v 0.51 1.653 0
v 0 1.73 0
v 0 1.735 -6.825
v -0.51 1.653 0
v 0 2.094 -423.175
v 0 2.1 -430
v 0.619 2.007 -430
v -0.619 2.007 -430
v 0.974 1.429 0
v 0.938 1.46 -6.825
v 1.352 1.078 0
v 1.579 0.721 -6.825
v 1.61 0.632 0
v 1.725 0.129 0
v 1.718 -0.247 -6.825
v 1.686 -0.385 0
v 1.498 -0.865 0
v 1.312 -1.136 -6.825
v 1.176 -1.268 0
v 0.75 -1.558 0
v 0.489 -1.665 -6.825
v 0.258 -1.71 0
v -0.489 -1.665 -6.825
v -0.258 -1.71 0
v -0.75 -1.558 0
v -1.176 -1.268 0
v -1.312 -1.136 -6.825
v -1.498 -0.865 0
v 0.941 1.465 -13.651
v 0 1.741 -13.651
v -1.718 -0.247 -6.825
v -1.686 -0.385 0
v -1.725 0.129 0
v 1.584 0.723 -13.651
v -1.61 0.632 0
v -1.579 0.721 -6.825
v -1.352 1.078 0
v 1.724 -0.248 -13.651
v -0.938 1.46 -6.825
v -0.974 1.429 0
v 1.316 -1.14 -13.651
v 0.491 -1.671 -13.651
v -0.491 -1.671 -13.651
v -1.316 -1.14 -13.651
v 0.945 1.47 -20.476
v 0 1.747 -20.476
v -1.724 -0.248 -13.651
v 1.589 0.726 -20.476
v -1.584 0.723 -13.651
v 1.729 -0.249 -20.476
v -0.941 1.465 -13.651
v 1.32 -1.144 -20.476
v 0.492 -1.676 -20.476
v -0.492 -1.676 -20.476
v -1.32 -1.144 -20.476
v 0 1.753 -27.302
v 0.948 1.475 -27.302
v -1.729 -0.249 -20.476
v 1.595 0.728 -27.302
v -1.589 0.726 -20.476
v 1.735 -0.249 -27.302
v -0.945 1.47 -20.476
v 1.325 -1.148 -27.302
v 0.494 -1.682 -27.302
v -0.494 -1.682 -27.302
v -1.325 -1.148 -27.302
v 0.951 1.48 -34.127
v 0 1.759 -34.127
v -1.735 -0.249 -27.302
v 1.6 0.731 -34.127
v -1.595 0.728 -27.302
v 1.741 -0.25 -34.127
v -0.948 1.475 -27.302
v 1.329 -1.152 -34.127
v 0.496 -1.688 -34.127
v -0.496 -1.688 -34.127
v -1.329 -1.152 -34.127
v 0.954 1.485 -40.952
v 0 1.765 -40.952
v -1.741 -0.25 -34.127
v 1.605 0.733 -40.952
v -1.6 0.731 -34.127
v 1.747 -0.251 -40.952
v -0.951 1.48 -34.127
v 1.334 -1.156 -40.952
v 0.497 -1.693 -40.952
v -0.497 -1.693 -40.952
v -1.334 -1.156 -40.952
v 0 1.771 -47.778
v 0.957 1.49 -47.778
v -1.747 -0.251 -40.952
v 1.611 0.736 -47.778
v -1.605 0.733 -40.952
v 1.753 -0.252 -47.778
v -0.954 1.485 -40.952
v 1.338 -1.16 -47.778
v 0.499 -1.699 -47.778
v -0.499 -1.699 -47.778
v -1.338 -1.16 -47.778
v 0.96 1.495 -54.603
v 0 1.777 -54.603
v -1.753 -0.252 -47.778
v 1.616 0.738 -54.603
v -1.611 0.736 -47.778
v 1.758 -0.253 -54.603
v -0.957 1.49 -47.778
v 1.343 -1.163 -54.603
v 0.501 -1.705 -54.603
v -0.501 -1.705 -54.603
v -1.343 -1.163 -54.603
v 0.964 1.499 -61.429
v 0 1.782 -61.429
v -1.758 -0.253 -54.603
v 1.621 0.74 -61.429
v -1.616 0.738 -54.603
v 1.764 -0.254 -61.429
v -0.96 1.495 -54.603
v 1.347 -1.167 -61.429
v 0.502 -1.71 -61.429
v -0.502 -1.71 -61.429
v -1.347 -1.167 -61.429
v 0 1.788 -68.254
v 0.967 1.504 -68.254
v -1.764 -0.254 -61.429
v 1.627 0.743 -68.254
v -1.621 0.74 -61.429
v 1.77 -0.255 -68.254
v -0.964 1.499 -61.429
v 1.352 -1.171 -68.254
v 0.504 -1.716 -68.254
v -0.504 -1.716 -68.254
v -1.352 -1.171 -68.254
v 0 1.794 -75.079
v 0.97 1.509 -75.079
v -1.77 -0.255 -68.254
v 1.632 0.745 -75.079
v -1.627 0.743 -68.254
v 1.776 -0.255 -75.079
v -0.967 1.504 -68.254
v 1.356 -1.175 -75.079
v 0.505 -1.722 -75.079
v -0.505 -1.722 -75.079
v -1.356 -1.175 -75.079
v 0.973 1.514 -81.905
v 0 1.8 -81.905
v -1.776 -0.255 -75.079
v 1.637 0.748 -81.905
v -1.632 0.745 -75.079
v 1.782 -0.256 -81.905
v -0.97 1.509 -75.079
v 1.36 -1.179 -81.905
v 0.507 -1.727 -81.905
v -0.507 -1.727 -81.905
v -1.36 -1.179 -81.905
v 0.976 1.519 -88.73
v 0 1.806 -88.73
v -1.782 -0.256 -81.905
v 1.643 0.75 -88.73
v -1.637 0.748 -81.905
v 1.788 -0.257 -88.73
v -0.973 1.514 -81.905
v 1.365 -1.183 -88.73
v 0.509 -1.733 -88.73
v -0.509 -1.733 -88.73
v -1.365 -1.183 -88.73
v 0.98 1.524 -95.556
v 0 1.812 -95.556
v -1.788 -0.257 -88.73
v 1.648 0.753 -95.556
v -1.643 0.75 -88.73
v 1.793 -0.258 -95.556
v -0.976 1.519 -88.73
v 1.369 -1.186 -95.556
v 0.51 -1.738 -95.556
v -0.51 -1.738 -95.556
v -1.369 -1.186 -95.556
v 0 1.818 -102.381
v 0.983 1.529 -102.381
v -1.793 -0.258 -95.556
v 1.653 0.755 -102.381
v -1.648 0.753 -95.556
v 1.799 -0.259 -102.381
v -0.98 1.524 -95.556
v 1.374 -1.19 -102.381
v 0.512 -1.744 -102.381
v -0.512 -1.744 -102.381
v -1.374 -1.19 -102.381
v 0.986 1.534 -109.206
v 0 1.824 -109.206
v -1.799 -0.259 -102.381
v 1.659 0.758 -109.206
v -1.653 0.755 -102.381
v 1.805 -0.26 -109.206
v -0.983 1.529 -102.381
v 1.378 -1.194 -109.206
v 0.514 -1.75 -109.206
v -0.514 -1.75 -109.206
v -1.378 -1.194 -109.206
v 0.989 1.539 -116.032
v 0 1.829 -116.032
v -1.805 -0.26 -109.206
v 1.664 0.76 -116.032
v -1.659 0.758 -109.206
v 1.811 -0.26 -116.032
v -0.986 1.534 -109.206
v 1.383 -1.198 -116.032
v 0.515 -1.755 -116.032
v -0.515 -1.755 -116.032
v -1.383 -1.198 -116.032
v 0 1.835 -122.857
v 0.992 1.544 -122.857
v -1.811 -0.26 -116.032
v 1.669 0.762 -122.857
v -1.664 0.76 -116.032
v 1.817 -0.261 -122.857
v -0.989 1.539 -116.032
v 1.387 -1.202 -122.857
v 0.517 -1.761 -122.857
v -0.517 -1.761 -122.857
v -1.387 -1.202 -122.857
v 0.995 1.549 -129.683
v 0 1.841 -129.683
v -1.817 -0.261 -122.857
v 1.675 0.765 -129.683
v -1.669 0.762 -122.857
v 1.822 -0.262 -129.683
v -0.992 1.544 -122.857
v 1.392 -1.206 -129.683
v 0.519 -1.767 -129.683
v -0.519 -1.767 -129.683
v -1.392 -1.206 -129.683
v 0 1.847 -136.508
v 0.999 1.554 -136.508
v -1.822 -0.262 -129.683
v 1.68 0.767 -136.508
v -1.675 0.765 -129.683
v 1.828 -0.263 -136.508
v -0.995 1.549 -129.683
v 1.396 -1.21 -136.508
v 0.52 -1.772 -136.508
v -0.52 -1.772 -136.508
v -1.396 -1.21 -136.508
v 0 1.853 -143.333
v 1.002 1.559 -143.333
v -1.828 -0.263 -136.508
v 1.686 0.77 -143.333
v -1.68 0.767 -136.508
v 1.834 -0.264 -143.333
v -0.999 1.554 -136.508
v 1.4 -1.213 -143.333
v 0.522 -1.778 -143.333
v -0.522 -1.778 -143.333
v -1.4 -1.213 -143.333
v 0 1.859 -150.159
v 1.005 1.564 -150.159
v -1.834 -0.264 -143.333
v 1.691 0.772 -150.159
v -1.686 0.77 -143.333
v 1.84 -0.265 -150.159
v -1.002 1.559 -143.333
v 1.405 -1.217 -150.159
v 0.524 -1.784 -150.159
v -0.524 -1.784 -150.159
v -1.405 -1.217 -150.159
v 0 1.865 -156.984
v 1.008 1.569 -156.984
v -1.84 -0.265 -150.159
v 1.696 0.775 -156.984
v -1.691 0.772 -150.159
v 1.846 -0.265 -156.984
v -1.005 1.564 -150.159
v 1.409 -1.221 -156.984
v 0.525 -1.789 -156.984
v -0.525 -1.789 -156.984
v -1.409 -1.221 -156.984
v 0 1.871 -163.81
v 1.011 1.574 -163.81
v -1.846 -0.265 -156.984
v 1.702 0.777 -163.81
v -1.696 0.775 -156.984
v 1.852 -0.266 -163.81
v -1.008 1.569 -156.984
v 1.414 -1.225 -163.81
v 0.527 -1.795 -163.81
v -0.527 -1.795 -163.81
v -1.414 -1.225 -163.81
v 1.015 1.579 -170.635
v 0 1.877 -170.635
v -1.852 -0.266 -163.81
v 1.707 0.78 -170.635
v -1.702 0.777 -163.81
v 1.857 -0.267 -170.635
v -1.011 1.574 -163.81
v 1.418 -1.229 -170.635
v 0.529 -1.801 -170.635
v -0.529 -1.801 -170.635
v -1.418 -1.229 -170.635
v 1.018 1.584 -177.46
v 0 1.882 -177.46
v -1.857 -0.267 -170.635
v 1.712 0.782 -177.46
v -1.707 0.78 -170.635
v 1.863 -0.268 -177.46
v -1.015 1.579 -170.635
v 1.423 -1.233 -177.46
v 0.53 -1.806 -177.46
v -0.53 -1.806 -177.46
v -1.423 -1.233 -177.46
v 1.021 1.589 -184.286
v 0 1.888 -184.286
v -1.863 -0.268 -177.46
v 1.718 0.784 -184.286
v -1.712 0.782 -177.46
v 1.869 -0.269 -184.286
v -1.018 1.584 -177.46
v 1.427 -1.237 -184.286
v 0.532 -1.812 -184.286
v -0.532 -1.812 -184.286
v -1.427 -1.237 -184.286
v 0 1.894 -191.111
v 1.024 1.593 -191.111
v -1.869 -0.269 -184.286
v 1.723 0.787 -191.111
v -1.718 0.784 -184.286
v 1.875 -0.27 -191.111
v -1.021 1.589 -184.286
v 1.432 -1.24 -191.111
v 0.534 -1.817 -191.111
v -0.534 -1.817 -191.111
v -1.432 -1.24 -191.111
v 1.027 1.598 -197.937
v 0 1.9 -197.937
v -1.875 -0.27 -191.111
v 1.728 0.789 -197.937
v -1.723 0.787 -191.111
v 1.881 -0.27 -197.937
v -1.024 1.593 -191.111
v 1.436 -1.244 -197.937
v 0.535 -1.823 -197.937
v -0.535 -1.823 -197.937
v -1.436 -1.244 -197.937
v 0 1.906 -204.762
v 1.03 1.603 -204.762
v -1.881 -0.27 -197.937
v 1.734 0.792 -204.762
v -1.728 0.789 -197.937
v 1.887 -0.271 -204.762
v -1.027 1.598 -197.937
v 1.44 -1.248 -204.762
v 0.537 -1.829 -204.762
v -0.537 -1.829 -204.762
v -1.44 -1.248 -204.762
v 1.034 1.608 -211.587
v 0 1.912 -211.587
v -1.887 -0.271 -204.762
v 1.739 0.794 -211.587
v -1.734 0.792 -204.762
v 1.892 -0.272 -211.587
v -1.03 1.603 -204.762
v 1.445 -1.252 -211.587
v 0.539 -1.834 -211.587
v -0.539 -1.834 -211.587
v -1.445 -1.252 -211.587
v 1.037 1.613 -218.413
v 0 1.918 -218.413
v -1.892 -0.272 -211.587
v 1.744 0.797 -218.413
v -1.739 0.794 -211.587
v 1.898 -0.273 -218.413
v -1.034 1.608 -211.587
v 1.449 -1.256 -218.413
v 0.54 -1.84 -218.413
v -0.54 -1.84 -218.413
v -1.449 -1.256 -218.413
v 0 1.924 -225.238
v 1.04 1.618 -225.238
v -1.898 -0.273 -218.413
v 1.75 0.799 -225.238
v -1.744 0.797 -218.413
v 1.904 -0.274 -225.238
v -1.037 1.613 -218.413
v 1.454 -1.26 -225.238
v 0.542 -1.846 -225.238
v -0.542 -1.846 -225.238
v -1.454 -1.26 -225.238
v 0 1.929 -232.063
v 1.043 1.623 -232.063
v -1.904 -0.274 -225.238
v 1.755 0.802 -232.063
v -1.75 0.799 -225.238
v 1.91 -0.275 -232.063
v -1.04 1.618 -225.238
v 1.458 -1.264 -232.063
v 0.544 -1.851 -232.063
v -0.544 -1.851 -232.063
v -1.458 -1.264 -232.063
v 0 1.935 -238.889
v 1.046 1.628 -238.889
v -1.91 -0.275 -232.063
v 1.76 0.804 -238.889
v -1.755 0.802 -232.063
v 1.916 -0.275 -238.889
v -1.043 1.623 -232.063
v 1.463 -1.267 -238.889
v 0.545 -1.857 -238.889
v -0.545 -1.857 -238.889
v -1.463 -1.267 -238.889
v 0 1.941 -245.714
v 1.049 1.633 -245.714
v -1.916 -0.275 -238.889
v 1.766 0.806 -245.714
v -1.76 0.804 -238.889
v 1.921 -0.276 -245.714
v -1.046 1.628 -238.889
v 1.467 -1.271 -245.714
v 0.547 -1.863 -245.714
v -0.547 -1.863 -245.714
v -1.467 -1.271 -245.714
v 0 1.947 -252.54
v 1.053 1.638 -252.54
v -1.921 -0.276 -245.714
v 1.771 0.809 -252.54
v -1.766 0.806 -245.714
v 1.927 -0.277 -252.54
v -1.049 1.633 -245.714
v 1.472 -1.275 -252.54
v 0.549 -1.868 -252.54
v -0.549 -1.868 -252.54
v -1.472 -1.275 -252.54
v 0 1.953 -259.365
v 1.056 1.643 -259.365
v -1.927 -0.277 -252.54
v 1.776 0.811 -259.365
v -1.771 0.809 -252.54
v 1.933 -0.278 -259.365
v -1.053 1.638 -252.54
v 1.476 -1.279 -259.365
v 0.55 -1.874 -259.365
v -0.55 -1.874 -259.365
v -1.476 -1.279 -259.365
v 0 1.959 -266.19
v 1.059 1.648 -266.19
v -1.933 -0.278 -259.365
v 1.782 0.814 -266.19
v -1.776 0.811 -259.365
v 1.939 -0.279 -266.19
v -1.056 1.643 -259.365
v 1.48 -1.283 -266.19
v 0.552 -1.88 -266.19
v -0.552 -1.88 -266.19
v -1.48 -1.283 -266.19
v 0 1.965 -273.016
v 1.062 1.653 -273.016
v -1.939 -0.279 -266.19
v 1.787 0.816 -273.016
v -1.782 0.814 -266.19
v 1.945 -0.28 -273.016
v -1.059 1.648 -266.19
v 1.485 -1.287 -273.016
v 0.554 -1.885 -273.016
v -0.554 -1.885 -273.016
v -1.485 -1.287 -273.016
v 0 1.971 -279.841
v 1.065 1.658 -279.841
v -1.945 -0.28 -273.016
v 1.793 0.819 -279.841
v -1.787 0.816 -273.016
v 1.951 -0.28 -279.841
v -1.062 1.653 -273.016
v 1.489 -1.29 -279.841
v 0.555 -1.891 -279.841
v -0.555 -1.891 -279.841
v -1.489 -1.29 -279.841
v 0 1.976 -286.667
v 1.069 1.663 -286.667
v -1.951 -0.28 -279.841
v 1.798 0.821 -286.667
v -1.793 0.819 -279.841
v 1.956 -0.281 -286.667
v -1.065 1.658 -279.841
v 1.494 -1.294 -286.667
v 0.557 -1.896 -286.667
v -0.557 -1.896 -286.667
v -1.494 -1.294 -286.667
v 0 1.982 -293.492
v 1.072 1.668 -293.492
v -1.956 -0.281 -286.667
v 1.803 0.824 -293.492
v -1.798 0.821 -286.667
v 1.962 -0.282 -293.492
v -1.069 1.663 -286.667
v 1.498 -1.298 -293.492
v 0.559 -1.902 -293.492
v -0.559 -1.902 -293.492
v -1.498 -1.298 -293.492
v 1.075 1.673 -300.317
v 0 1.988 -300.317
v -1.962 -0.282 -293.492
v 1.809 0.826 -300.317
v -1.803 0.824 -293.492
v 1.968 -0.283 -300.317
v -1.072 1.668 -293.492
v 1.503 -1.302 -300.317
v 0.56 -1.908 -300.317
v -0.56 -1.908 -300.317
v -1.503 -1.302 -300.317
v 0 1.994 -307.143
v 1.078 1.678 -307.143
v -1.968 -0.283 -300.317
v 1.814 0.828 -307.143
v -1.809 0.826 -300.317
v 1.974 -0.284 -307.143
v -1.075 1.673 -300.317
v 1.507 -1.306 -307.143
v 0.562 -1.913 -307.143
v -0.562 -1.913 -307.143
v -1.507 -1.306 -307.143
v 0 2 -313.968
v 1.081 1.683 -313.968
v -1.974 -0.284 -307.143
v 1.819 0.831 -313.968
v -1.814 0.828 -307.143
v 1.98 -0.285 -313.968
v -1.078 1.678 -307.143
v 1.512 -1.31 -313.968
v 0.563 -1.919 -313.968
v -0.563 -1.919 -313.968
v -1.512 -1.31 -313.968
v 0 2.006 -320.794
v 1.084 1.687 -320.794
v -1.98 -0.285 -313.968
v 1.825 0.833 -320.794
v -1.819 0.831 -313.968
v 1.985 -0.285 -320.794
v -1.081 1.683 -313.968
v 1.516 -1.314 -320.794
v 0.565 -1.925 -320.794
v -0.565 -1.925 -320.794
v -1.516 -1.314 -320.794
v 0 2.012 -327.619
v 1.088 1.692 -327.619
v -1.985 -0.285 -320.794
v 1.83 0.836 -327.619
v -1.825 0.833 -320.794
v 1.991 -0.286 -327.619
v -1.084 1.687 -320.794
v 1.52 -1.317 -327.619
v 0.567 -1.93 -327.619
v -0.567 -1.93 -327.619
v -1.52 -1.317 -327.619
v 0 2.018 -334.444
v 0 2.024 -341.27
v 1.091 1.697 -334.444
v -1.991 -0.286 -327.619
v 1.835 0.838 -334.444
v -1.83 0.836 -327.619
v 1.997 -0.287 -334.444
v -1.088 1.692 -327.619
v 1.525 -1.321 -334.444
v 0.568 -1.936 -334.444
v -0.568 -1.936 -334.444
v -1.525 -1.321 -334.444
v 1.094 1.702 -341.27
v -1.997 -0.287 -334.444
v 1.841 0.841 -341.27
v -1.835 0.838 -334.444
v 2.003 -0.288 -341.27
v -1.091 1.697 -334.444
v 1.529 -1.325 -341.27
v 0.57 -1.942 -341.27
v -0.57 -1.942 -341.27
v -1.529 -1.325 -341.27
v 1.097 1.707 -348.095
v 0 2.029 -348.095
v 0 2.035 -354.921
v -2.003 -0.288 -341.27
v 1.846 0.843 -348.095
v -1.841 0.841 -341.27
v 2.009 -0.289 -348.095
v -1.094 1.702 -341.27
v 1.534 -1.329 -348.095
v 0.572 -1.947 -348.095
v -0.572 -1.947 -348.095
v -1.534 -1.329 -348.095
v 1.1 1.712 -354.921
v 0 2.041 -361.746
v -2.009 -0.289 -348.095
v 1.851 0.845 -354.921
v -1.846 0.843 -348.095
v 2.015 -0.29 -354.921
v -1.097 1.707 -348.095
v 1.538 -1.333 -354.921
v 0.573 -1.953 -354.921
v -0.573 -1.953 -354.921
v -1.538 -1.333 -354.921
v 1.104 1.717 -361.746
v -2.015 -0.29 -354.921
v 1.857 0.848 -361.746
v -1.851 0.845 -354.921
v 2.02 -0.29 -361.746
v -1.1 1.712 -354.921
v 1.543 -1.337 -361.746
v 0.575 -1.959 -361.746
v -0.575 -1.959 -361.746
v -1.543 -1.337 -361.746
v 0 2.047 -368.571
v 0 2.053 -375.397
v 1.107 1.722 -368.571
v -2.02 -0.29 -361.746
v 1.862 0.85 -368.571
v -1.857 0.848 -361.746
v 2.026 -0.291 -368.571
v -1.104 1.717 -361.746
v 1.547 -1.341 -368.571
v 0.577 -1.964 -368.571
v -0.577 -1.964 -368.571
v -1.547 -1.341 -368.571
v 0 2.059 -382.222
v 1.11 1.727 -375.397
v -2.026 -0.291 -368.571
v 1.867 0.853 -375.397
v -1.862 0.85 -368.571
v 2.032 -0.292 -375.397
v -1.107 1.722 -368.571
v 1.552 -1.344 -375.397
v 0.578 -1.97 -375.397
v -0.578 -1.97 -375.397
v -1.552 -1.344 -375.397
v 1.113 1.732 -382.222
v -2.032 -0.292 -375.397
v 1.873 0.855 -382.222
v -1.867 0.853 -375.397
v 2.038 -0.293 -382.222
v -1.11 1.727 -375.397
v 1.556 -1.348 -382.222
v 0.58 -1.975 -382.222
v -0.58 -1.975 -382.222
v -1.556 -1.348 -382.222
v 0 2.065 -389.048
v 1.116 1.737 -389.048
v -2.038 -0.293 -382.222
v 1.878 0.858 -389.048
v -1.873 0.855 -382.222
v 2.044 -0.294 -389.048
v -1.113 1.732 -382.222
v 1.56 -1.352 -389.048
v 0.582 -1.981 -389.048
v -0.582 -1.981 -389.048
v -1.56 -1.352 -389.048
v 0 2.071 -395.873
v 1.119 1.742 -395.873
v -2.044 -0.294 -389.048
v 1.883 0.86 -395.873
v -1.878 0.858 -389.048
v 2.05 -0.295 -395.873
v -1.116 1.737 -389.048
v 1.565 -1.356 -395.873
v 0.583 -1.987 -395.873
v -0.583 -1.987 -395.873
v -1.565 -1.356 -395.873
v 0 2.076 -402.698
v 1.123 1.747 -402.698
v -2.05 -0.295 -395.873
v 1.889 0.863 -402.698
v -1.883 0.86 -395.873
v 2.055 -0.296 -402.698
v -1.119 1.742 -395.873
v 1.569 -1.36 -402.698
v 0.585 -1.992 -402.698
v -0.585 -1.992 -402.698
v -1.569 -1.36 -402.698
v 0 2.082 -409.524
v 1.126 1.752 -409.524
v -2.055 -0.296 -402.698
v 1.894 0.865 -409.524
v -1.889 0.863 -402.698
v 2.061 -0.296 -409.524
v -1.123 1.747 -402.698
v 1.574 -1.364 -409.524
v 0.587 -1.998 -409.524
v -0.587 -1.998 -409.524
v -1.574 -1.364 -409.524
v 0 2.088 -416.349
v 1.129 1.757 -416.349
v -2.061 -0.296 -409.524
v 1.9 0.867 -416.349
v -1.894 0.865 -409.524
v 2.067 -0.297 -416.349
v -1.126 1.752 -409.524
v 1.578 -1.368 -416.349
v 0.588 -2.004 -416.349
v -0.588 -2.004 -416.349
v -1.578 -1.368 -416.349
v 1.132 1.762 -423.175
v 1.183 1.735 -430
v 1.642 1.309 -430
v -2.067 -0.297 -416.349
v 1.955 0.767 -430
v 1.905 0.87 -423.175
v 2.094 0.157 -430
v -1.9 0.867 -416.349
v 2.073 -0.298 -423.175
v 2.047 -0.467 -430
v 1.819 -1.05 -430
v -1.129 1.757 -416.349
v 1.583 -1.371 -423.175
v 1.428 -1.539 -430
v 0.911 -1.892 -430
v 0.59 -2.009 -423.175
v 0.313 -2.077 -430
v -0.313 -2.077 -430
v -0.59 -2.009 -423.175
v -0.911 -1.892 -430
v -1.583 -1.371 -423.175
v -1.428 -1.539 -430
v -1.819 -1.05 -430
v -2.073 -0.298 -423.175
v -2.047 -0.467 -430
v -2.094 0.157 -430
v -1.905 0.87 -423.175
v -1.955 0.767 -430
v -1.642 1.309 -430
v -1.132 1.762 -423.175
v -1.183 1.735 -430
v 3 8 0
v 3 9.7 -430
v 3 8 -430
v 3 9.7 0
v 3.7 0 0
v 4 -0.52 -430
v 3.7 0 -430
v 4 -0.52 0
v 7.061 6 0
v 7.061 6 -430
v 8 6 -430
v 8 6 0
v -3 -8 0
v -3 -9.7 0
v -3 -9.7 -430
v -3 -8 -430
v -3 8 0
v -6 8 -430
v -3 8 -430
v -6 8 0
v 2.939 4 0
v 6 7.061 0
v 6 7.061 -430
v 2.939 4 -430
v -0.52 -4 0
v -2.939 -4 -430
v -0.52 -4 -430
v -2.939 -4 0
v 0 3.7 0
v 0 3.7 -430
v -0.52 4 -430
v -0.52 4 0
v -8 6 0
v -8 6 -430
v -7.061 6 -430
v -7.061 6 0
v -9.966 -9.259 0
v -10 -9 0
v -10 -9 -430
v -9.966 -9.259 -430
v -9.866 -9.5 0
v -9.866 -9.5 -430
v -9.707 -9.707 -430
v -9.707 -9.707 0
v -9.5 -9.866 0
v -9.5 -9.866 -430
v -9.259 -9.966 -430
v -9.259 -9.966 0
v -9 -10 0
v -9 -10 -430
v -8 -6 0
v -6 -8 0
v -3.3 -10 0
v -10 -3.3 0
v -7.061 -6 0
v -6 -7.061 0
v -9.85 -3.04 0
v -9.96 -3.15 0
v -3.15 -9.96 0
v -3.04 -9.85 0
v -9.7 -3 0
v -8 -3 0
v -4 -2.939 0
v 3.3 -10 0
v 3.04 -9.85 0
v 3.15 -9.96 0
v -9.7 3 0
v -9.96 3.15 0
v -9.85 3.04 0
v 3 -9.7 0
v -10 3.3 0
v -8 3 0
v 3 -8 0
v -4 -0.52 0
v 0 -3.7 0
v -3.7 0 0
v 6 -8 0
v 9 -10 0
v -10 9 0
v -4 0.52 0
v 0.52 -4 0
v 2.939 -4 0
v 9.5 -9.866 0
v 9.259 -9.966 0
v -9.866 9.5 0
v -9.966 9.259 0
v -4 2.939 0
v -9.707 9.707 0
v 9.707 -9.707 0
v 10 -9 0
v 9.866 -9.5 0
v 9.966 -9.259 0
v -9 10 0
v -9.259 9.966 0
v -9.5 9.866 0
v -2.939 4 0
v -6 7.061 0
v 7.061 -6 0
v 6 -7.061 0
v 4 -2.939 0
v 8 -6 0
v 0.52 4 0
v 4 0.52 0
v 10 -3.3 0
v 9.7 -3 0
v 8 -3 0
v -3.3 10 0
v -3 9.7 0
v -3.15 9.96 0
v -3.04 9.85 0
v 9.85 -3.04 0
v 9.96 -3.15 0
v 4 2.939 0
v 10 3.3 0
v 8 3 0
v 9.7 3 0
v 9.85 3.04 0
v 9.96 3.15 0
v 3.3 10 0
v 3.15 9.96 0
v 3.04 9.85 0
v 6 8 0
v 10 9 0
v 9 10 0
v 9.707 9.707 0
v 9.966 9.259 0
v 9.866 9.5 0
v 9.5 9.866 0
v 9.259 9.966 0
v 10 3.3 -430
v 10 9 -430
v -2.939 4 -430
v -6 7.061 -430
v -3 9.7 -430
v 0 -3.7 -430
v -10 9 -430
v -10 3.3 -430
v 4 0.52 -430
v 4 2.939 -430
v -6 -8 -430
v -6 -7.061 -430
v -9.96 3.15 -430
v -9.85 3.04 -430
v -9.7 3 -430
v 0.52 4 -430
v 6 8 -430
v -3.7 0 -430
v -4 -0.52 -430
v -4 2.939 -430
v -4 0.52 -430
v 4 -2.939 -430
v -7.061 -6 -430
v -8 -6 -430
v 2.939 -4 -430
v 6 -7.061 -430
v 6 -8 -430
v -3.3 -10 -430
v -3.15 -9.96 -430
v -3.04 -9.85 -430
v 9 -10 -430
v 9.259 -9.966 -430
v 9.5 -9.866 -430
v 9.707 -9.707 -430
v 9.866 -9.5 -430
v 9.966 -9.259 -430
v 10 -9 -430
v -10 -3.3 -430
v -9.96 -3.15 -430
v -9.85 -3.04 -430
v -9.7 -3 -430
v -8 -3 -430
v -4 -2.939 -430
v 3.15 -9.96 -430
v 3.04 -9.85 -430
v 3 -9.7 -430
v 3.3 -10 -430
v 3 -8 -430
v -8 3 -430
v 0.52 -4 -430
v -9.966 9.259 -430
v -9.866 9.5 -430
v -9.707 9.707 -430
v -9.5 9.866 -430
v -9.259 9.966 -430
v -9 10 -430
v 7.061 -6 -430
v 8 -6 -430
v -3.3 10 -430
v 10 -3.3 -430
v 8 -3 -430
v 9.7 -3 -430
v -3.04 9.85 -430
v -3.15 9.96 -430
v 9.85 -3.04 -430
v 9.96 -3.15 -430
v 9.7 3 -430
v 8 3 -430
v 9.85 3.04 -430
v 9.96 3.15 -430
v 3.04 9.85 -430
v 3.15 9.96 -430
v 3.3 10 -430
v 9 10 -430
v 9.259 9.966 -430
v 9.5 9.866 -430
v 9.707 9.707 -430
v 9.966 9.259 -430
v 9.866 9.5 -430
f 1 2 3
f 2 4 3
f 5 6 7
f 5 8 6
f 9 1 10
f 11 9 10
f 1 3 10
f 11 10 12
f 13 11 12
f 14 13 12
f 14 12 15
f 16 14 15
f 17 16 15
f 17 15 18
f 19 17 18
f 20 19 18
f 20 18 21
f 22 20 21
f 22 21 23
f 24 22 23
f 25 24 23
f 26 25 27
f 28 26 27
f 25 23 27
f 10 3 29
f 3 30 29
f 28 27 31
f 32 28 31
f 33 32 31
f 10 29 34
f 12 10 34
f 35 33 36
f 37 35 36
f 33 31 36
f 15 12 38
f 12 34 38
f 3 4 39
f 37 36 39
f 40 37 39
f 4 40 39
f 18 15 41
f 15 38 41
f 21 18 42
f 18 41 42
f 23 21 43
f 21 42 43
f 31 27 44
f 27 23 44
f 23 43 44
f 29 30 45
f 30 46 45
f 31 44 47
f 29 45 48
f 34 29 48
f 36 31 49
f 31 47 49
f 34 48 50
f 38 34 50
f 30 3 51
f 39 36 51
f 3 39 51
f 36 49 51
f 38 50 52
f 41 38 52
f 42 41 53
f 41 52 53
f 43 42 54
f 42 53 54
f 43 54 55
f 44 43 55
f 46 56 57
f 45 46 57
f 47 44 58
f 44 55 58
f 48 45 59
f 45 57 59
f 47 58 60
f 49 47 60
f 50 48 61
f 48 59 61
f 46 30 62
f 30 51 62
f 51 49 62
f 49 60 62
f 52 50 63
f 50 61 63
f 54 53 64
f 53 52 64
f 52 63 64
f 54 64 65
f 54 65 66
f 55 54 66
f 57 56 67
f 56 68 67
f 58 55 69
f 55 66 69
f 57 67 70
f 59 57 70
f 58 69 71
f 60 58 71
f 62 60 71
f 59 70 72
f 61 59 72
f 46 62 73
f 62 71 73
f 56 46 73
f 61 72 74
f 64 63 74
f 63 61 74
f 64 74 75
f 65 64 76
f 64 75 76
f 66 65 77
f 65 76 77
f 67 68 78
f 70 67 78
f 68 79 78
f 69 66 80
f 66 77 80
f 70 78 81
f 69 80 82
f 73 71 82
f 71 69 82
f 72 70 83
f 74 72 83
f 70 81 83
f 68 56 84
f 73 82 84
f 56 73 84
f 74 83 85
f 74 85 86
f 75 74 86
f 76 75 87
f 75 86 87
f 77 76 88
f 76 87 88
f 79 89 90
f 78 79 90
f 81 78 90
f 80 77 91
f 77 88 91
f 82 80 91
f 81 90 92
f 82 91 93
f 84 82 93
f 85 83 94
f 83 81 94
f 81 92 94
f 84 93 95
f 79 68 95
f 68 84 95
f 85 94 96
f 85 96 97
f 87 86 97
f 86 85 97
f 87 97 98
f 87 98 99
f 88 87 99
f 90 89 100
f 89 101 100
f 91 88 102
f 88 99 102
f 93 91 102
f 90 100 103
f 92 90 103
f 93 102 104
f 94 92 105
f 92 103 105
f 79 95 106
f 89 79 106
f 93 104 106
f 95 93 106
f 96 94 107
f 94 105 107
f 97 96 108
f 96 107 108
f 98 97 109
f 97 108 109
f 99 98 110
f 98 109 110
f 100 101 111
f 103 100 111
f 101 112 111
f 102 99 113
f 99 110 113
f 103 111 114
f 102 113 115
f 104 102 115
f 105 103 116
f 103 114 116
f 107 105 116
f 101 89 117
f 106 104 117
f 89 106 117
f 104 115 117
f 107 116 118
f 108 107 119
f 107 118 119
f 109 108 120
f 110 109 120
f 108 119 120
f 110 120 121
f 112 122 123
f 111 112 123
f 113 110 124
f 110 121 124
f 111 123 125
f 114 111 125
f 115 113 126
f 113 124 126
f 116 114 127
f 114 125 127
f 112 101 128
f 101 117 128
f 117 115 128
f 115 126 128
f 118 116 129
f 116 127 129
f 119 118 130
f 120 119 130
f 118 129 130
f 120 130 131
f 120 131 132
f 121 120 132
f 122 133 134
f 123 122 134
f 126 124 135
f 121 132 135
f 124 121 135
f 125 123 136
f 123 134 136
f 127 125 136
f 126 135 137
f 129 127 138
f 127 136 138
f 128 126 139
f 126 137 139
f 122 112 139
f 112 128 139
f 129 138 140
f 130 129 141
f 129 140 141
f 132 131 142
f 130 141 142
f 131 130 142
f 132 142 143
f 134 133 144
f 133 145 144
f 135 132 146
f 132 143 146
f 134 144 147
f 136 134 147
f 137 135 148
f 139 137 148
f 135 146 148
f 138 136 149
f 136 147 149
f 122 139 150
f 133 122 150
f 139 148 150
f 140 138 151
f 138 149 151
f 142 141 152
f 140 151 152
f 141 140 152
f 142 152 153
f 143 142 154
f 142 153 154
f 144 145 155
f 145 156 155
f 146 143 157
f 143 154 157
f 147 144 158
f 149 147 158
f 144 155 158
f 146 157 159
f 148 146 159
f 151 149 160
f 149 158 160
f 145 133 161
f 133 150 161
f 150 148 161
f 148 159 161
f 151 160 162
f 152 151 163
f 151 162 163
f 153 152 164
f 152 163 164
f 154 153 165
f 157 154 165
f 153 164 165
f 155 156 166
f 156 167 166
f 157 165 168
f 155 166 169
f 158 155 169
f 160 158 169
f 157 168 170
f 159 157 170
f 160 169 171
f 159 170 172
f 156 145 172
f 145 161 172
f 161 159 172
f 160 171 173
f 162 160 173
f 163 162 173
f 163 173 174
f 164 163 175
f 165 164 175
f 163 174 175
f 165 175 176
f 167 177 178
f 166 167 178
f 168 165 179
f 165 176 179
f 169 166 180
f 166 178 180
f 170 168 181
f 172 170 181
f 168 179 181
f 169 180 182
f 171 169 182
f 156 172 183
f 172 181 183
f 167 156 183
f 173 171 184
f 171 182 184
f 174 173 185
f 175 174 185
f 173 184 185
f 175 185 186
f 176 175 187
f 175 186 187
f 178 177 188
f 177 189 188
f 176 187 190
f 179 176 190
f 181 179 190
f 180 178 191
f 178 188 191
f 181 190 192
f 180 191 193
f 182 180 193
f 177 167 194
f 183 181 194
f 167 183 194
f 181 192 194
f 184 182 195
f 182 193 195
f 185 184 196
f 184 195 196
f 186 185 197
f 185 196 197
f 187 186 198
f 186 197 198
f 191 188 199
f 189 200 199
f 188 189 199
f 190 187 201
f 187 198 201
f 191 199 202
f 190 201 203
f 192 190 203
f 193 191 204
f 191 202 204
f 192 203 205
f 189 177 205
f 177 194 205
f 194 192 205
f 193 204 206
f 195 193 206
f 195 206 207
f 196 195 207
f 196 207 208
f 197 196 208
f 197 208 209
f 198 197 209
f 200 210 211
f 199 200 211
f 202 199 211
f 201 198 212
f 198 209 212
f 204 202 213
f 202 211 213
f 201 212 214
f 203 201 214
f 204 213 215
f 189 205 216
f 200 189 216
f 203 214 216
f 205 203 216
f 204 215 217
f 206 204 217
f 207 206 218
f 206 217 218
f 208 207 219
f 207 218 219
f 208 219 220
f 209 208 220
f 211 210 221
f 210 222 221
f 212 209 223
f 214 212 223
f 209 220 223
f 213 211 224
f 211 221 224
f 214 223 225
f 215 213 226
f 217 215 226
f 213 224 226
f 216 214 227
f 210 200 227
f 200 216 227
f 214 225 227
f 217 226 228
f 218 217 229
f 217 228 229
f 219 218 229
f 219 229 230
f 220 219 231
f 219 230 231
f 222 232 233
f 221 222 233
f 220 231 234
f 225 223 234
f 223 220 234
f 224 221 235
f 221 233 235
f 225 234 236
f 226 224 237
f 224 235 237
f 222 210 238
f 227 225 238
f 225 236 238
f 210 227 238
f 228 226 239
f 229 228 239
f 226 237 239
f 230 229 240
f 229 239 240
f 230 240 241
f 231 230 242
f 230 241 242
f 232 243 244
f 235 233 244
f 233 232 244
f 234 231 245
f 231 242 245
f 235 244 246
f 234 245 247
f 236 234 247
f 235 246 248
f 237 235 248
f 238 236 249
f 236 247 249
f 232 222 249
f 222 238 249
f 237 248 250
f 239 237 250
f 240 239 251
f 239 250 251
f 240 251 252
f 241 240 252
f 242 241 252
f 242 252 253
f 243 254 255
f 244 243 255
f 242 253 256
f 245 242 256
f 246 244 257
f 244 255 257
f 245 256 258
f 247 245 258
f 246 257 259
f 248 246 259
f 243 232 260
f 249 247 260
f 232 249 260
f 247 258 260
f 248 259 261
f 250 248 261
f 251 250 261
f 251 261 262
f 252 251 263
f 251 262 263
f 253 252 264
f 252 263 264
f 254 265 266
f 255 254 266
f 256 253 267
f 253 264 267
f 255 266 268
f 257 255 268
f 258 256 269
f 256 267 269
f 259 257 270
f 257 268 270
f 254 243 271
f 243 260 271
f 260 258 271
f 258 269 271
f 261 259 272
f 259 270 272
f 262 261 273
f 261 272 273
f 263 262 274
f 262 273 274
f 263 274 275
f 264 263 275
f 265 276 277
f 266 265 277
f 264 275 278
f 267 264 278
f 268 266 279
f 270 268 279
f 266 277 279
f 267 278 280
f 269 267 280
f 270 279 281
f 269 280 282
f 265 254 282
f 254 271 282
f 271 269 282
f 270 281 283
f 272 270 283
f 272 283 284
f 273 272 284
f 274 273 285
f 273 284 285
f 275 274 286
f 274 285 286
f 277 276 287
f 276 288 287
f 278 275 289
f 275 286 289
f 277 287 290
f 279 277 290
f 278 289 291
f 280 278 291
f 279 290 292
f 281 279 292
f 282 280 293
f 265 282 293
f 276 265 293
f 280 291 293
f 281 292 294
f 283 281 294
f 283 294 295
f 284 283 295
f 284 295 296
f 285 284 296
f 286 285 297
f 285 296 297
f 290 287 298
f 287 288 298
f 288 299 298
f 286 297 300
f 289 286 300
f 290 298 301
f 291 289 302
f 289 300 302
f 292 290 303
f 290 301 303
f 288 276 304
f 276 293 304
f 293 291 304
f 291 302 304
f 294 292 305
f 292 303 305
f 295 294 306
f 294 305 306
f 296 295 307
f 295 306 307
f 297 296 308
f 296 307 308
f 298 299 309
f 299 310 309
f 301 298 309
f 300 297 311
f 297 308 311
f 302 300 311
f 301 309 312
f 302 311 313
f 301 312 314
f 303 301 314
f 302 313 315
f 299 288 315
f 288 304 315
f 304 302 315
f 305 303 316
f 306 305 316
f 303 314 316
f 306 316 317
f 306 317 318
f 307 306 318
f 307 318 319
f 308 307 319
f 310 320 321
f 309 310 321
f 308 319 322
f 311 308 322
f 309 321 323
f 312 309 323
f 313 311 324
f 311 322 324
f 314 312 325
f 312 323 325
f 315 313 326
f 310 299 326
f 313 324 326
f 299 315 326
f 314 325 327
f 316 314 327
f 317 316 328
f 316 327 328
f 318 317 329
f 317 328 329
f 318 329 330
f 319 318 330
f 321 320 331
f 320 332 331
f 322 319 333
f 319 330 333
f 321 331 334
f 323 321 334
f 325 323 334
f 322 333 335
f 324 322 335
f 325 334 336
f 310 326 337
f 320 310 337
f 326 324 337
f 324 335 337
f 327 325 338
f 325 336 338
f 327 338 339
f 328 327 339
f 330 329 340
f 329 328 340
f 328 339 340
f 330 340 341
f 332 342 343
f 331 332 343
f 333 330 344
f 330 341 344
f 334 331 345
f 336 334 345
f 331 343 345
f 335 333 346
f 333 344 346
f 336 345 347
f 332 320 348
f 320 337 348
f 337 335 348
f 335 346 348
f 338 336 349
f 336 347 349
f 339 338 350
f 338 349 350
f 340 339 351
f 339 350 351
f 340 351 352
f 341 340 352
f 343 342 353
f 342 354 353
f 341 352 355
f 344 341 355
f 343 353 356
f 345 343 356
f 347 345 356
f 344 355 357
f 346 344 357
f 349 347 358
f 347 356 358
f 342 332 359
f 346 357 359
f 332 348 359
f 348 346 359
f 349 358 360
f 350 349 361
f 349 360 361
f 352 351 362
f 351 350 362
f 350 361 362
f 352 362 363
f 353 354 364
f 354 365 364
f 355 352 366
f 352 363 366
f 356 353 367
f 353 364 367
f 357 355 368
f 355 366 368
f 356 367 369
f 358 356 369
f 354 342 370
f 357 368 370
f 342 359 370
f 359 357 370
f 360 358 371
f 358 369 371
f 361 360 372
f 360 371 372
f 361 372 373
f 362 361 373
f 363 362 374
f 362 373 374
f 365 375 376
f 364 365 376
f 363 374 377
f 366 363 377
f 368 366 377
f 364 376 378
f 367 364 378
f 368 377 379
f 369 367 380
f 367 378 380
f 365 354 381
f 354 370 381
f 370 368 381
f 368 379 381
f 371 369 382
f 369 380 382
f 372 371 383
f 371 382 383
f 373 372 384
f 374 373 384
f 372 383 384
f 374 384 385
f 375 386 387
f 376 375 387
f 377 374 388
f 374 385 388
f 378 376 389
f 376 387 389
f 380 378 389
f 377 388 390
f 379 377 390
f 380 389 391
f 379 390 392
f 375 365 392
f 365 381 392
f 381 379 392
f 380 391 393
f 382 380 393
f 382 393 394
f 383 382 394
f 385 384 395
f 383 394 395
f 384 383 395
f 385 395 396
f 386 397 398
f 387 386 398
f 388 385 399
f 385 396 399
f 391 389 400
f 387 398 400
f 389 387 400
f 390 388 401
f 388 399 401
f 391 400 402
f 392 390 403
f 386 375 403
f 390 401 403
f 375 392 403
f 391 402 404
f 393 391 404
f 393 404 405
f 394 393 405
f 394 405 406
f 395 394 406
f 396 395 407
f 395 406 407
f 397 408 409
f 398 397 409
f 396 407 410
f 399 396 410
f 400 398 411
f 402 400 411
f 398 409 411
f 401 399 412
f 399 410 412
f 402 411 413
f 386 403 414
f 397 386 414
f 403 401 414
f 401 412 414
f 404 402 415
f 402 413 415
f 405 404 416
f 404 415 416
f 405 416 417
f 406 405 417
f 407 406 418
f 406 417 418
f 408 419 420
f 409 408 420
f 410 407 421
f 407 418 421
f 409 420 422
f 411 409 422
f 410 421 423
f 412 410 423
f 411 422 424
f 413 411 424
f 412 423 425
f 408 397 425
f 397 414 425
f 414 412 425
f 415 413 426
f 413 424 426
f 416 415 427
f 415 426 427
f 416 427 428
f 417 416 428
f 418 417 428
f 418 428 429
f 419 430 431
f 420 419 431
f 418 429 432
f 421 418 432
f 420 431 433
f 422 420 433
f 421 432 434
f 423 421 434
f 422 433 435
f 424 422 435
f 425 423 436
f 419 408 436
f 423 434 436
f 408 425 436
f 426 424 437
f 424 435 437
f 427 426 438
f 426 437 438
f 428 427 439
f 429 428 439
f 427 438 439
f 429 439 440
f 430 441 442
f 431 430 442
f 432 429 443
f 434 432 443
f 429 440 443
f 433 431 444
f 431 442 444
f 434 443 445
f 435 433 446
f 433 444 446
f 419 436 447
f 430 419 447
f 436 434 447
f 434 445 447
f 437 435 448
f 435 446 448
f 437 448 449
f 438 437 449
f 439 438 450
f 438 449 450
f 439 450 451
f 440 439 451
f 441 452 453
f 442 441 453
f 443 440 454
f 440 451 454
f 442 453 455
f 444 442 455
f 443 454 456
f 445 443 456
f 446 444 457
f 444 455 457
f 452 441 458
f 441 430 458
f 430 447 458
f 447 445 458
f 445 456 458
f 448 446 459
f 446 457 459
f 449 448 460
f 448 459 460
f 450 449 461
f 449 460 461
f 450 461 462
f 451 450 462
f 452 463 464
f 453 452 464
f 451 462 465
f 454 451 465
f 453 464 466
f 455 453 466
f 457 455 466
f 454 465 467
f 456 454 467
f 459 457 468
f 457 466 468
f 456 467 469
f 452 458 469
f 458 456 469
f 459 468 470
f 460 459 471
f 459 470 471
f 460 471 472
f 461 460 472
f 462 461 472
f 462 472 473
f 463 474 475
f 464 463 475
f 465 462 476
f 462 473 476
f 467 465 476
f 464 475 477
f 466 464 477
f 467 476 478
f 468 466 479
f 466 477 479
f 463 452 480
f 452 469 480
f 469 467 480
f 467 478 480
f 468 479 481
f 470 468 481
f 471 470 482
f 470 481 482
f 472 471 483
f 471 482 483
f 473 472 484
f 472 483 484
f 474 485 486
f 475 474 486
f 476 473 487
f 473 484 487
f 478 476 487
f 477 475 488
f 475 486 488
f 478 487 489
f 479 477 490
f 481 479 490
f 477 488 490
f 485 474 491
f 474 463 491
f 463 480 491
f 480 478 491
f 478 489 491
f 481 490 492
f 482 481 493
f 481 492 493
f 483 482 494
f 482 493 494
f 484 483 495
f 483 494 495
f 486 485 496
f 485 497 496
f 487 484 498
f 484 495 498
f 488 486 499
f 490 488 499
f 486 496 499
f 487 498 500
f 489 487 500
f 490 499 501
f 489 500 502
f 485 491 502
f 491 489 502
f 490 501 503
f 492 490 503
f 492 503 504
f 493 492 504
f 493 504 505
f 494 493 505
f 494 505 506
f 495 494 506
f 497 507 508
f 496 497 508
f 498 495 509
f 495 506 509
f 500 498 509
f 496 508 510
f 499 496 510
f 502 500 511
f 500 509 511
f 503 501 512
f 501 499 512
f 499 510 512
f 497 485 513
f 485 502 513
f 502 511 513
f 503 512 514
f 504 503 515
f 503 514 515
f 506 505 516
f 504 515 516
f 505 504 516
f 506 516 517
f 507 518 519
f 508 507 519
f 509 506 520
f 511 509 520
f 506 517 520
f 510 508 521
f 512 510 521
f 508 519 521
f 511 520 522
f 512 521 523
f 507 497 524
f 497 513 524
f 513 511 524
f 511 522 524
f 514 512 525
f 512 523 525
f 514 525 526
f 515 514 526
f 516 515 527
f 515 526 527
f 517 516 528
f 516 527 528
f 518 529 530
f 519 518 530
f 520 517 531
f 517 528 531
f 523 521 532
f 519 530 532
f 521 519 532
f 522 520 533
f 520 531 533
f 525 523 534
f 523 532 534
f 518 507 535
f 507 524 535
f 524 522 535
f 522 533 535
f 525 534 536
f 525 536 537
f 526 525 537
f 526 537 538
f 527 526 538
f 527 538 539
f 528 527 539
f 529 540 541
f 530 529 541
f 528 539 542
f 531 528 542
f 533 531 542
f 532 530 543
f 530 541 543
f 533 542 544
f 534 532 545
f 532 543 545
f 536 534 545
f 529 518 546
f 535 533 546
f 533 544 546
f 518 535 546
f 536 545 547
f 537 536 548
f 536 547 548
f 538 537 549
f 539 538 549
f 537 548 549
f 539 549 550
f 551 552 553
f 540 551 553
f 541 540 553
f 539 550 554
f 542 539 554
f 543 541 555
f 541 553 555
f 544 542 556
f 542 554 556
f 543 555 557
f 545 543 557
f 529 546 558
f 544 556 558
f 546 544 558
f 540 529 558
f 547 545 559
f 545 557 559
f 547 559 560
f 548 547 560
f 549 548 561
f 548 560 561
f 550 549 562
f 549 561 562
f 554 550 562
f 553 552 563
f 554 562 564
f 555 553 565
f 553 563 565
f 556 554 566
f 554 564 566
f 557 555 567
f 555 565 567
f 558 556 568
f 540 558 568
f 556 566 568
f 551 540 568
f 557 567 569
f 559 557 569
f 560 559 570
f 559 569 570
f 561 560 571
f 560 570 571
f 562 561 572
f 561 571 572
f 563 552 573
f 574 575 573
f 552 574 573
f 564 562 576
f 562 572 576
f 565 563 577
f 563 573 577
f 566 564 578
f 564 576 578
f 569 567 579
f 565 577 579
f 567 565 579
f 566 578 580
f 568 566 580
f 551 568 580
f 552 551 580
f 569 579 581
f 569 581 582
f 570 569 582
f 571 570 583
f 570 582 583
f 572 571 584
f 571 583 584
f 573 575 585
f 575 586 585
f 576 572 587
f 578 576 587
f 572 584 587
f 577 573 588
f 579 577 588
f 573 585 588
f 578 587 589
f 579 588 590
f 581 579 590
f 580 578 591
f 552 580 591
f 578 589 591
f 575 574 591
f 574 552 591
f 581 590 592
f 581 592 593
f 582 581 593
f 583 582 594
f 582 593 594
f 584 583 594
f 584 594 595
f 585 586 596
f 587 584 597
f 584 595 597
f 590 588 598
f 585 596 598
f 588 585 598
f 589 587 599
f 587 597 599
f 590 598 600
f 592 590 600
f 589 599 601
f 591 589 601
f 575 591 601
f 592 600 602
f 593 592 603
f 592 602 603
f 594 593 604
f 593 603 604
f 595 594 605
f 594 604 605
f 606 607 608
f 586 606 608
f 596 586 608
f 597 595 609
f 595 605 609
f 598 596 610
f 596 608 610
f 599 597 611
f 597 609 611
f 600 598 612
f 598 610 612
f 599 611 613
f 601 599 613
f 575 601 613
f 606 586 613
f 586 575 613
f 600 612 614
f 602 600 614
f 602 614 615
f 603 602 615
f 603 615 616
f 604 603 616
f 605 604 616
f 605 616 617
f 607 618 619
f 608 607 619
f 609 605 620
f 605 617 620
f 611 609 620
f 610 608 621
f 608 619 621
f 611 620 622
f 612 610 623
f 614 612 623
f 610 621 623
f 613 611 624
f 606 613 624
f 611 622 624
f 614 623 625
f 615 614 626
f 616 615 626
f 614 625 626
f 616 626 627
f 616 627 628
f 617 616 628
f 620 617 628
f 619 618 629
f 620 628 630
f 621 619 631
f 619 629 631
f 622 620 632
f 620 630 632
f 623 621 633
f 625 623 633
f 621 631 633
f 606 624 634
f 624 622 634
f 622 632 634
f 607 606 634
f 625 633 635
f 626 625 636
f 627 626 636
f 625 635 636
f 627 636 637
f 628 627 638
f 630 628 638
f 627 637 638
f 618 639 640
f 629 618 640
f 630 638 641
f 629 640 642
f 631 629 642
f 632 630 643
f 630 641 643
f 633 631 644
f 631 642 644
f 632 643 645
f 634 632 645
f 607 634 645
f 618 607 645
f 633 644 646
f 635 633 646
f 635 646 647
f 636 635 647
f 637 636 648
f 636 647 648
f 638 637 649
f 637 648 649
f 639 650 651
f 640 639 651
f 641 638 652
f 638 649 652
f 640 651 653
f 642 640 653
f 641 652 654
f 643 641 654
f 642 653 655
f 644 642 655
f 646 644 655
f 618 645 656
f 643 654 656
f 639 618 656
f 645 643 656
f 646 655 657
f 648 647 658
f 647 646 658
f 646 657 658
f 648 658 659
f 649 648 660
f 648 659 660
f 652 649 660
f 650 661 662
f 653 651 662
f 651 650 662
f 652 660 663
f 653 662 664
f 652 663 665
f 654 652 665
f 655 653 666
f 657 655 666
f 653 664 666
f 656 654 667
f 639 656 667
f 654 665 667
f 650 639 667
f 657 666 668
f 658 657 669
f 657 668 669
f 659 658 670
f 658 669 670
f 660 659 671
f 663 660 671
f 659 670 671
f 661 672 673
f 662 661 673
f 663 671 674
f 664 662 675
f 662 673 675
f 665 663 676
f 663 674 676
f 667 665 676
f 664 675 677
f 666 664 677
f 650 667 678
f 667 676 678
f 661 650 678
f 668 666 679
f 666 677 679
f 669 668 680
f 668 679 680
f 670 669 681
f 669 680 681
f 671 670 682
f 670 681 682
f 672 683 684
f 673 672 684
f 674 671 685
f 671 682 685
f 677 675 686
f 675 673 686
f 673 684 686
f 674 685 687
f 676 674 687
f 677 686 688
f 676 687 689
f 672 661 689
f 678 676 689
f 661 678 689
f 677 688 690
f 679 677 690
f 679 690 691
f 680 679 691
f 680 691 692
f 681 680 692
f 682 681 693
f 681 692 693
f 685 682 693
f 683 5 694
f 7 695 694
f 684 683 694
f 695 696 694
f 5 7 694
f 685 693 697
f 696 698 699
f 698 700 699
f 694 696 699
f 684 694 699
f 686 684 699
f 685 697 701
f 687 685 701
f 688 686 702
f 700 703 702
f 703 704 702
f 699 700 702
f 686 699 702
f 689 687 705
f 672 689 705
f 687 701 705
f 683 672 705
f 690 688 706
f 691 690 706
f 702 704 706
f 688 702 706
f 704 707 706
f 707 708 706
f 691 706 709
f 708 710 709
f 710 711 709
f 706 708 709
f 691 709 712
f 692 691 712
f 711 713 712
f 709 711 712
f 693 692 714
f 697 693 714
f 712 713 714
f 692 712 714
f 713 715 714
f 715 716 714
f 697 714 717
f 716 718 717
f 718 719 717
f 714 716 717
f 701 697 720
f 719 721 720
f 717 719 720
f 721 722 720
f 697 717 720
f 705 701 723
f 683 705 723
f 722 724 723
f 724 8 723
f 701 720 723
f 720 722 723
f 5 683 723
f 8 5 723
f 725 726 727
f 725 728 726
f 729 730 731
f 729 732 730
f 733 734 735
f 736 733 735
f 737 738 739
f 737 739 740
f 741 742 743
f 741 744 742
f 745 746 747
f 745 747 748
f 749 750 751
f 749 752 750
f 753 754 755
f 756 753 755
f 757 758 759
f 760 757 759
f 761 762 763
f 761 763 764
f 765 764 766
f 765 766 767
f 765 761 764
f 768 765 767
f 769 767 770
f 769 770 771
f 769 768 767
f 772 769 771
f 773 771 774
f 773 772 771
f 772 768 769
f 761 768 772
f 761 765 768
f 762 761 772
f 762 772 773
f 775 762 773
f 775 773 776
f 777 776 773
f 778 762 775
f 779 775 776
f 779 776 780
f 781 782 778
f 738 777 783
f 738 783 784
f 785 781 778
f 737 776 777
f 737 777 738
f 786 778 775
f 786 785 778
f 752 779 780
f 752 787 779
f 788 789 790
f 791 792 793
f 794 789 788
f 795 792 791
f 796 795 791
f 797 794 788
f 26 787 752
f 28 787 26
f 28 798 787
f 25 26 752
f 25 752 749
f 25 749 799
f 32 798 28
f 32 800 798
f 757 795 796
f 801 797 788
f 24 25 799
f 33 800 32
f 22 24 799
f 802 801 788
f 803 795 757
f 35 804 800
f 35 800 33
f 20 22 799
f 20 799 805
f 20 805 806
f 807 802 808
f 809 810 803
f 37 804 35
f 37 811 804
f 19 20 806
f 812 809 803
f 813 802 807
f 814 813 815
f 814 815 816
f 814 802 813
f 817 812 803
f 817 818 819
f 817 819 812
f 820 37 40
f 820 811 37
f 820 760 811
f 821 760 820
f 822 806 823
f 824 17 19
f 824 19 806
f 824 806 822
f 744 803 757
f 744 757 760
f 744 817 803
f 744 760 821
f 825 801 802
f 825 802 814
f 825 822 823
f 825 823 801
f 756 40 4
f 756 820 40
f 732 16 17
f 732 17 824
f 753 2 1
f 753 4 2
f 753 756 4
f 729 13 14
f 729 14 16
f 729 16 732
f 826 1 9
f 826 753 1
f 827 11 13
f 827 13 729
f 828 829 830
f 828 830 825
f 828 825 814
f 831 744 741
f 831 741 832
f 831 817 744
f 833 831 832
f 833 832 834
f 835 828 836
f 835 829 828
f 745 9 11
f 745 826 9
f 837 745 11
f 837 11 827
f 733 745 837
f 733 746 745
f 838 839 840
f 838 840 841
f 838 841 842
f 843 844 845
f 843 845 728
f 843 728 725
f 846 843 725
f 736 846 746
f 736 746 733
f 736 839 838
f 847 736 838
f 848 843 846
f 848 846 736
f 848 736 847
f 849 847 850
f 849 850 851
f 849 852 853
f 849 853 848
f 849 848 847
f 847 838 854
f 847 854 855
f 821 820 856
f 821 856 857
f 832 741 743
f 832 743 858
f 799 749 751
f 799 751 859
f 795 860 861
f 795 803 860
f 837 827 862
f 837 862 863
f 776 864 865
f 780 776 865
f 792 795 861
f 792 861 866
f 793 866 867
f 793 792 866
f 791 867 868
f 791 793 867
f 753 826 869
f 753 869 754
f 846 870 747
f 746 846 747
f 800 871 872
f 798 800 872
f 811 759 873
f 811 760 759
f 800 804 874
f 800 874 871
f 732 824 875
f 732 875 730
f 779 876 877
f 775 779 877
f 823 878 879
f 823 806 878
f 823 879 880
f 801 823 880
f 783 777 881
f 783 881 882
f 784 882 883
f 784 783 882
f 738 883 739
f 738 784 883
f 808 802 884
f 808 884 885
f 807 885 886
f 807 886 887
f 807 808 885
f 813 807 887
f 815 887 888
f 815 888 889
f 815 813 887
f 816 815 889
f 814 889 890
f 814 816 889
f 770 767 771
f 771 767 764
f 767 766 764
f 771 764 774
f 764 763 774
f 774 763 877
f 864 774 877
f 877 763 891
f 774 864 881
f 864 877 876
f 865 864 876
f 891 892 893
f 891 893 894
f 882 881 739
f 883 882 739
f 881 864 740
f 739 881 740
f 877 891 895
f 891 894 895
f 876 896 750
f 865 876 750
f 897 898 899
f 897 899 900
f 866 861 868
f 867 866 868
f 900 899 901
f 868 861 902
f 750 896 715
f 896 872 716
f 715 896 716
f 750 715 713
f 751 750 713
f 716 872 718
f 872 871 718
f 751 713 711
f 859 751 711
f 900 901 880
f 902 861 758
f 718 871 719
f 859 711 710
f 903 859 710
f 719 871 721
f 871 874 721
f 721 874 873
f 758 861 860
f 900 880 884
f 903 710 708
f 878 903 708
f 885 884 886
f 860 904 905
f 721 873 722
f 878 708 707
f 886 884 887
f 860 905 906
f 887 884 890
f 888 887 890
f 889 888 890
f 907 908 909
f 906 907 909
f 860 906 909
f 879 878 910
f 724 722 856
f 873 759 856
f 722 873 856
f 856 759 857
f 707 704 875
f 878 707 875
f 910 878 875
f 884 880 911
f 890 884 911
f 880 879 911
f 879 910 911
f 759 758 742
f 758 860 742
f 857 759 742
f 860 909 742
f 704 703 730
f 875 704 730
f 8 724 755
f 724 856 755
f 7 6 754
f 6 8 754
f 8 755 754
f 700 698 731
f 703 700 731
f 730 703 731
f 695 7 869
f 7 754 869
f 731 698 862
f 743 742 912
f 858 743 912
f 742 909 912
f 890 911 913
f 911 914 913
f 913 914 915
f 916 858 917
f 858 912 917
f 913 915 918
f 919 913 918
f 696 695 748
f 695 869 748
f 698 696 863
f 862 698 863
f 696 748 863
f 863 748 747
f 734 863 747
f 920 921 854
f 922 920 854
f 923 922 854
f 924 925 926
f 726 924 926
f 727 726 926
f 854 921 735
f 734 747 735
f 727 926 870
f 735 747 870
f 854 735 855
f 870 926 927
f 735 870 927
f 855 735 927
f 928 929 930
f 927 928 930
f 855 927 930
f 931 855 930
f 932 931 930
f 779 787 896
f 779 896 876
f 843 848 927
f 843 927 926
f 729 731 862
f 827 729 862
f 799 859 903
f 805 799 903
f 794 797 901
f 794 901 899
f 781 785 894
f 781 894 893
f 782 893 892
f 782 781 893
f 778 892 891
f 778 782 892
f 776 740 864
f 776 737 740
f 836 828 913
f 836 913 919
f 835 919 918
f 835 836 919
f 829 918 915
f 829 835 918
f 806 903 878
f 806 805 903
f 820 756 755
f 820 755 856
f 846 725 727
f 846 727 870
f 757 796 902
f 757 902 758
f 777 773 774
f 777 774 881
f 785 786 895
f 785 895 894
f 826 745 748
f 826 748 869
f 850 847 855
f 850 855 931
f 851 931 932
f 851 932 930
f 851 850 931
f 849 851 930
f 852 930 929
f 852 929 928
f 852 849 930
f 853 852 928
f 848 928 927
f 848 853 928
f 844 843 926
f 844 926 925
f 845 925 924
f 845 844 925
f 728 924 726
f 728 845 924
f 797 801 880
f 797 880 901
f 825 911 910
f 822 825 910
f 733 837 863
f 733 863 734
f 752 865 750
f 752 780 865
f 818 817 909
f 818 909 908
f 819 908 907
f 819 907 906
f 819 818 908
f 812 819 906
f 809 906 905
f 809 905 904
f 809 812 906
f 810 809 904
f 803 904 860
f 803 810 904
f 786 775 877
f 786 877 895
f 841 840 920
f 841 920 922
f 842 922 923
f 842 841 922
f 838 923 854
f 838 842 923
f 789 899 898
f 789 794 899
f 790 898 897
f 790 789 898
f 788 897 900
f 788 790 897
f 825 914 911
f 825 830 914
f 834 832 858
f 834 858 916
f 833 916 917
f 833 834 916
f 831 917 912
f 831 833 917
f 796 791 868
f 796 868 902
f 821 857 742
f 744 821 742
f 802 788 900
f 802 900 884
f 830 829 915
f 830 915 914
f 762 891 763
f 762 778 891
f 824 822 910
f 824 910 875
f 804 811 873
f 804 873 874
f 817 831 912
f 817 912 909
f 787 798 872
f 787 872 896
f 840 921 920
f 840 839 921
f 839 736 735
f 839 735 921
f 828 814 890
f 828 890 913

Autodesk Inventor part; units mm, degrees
sketch "Sketch_1" plane through (0, 0, 0) normal (0, 0, 1) x (1, 0, 0)
  line L0 (-10, 9) -> (-10, 3.3)
  arc A0 (-10, 3.3) -> (-9.7, 3) centre (-9.7, 3.3) ccw
  line L1 (-9.7, 3) -> (-8, 3)
  line L2 (-8, 3) -> (-8, 6)
  line L3 (-8, 6) -> (-7.0607, 6)
  line L4 (-7.0607, 6) -> (-4, 2.9393)
  line L5 (-4, 2.9393) -> (-4, 0.5196)
  line L6 (-4, 0.5196) -> (-3.7, 0)
  line L7 (-3.7, 0) -> (-4, -0.5196)
  line L8 (-4, -0.5196) -> (-4, -2.9393)
  line L9 (-4, -2.9393) -> (-7.0607, -6)
  line L10 (-7.0607, -6) -> (-8, -6)
  line L11 (-8, -6) -> (-8, -3)
  line L12 (-8, -3) -> (-9.7, -3)
  arc A1 (-9.7, -3) -> (-10, -3.3) centre (-9.7, -3.3) ccw
  line L13 (-10, -3.3) -> (-10, -9)
  arc A2 (-10, -9) -> (-9, -10) centre (-9, -9) ccw
  line L14 (-9, -10) -> (-3.3, -10)
  arc A3 (-3.3, -10) -> (-3, -9.7) centre (-3.3, -9.7) ccw
  line L15 (-3, -9.7) -> (-3, -8)
  line L16 (-3, -8) -> (-6, -8)
  line L17 (-6, -8) -> (-6, -7.0607)
  line L18 (-6, -7.0607) -> (-2.9393, -4)
  line L19 (-2.9393, -4) -> (-0.5196, -4)
  line L20 (-0.5196, -4) -> (0, -3.7)
  line L21 (0, -3.7) -> (0.5196, -4)
  line L22 (0.5196, -4) -> (2.9393, -4)
  line L23 (2.9393, -4) -> (6, -7.0607)
  line L24 (6, -7.0607) -> (6, -8)
  line L25 (6, -8) -> (3, -8)
  line L26 (3, -8) -> (3, -9.7)
  arc A4 (3, -9.7) -> (3.3, -10) centre (3.3, -9.7) ccw
  line L27 (3.3, -10) -> (9, -10)
  arc A5 (9, -10) -> (10, -9) centre (9, -9) ccw
  line L28 (10, -9) -> (10, -3.3)
  arc A6 (10, -3.3) -> (9.7, -3) centre (9.7, -3.3) ccw
  line L29 (9.7, -3) -> (8, -3)
  line L30 (8, -3) -> (8, -6)
  line L31 (8, -6) -> (7.0606, -6)
  line L32 (7.0606, -6) -> (4, -2.9393)
  line L33 (4, -2.9393) -> (4, -0.5196)
  line L34 (4, -0.5196) -> (3.7, 0)
  line L35 (3.7, 0) -> (4, 0.5196)
  line L36 (4, 0.5196) -> (4, 2.9393)
  line L37 (4, 2.9393) -> (7.0607, 6)
  line L38 (7.0607, 6) -> (8, 6)
  line L39 (8, 6) -> (8, 3)
  line L40 (8, 3) -> (9.7, 3)
  arc A7 (9.7, 3) -> (10, 3.3) centre (9.7, 3.3) ccw
  line L41 (10, 3.3) -> (10, 9)
  arc A8 (10, 9) -> (9, 10) centre (9, 9) ccw
  line L42 (9, 10) -> (3.3, 10)
  arc A9 (3.3, 10) -> (3, 9.7) centre (3.3, 9.7) ccw
  line L43 (3, 9.7) -> (3, 8)
  line L44 (3, 8) -> (6, 8)
  line L45 (6, 8) -> (6, 7.0607)
  line L46 (6, 7.0607) -> (2.9393, 4)
  line L47 (2.9393, 4) -> (0.5196, 4)
  line L48 (0.5196, 4) -> (0, 3.7)
  line L49 (0, 3.7) -> (-0.5196, 4)
  line L50 (-0.5196, 4) -> (-2.9394, 4)
  line L51 (-2.9394, 4) -> (-6, 7.0606)
  line L52 (-6, 7.0606) -> (-6, 8)
  line L53 (-6, 8) -> (-3, 8)
  line L54 (-3, 8) -> (-3, 9.7)
  arc A10 (-3, 9.7) -> (-3.3, 10) centre (-3.3, 9.7) ccw
  line L55 (-3.3, 10) -> (-9, 10)
  arc A11 (-9, 10) -> (-10, 9) centre (-9, 9) ccw
extrude "Extrusion1" add sketch "Sketch_1" against normal blind 430
sketch "Sketch_2" plane through (0, 0, 0) normal (1, 0, 0) x (0, 0, -1)
  line L0 (430, -2.9393) -> (430, -0.5196) projected
  line L1 (0, 0.5196) -> (0, 2.9393) projected
  line L2 (0, 0) -> (0, 0.5196) projected
  line L3 (0, 0) -> (430, 0)
  line L4 (430, 0) -> (430, 2.1)
  line L5 (430, 0.5196) -> (430, 2.9393) projected
  line L6 (430, 2.1) -> (0, 1.7295)
  line L7 (0, 1.7295) -> (0, 0)
  dimension "d3" = 2.1
ref_plane "C1_XY" through (0, 0, 0) normal (0, 0, 1) x (1, 0, 0)
ref_plane "C1_YZ" through (0, 0, 0) normal (1, 0, 0) x (0, 1, 0)
ref_plane "C1_ZX" through (0, 0, 0) normal (0, 1, 0) x (0, 0, 1)
revolve "Revolution2" cut sketch "Sketch_2" angle 360 about axis through (0, 0, 0) along (0, 0, -1)
properties part number "FrameFrontBack" material "Aluminum 6061"
